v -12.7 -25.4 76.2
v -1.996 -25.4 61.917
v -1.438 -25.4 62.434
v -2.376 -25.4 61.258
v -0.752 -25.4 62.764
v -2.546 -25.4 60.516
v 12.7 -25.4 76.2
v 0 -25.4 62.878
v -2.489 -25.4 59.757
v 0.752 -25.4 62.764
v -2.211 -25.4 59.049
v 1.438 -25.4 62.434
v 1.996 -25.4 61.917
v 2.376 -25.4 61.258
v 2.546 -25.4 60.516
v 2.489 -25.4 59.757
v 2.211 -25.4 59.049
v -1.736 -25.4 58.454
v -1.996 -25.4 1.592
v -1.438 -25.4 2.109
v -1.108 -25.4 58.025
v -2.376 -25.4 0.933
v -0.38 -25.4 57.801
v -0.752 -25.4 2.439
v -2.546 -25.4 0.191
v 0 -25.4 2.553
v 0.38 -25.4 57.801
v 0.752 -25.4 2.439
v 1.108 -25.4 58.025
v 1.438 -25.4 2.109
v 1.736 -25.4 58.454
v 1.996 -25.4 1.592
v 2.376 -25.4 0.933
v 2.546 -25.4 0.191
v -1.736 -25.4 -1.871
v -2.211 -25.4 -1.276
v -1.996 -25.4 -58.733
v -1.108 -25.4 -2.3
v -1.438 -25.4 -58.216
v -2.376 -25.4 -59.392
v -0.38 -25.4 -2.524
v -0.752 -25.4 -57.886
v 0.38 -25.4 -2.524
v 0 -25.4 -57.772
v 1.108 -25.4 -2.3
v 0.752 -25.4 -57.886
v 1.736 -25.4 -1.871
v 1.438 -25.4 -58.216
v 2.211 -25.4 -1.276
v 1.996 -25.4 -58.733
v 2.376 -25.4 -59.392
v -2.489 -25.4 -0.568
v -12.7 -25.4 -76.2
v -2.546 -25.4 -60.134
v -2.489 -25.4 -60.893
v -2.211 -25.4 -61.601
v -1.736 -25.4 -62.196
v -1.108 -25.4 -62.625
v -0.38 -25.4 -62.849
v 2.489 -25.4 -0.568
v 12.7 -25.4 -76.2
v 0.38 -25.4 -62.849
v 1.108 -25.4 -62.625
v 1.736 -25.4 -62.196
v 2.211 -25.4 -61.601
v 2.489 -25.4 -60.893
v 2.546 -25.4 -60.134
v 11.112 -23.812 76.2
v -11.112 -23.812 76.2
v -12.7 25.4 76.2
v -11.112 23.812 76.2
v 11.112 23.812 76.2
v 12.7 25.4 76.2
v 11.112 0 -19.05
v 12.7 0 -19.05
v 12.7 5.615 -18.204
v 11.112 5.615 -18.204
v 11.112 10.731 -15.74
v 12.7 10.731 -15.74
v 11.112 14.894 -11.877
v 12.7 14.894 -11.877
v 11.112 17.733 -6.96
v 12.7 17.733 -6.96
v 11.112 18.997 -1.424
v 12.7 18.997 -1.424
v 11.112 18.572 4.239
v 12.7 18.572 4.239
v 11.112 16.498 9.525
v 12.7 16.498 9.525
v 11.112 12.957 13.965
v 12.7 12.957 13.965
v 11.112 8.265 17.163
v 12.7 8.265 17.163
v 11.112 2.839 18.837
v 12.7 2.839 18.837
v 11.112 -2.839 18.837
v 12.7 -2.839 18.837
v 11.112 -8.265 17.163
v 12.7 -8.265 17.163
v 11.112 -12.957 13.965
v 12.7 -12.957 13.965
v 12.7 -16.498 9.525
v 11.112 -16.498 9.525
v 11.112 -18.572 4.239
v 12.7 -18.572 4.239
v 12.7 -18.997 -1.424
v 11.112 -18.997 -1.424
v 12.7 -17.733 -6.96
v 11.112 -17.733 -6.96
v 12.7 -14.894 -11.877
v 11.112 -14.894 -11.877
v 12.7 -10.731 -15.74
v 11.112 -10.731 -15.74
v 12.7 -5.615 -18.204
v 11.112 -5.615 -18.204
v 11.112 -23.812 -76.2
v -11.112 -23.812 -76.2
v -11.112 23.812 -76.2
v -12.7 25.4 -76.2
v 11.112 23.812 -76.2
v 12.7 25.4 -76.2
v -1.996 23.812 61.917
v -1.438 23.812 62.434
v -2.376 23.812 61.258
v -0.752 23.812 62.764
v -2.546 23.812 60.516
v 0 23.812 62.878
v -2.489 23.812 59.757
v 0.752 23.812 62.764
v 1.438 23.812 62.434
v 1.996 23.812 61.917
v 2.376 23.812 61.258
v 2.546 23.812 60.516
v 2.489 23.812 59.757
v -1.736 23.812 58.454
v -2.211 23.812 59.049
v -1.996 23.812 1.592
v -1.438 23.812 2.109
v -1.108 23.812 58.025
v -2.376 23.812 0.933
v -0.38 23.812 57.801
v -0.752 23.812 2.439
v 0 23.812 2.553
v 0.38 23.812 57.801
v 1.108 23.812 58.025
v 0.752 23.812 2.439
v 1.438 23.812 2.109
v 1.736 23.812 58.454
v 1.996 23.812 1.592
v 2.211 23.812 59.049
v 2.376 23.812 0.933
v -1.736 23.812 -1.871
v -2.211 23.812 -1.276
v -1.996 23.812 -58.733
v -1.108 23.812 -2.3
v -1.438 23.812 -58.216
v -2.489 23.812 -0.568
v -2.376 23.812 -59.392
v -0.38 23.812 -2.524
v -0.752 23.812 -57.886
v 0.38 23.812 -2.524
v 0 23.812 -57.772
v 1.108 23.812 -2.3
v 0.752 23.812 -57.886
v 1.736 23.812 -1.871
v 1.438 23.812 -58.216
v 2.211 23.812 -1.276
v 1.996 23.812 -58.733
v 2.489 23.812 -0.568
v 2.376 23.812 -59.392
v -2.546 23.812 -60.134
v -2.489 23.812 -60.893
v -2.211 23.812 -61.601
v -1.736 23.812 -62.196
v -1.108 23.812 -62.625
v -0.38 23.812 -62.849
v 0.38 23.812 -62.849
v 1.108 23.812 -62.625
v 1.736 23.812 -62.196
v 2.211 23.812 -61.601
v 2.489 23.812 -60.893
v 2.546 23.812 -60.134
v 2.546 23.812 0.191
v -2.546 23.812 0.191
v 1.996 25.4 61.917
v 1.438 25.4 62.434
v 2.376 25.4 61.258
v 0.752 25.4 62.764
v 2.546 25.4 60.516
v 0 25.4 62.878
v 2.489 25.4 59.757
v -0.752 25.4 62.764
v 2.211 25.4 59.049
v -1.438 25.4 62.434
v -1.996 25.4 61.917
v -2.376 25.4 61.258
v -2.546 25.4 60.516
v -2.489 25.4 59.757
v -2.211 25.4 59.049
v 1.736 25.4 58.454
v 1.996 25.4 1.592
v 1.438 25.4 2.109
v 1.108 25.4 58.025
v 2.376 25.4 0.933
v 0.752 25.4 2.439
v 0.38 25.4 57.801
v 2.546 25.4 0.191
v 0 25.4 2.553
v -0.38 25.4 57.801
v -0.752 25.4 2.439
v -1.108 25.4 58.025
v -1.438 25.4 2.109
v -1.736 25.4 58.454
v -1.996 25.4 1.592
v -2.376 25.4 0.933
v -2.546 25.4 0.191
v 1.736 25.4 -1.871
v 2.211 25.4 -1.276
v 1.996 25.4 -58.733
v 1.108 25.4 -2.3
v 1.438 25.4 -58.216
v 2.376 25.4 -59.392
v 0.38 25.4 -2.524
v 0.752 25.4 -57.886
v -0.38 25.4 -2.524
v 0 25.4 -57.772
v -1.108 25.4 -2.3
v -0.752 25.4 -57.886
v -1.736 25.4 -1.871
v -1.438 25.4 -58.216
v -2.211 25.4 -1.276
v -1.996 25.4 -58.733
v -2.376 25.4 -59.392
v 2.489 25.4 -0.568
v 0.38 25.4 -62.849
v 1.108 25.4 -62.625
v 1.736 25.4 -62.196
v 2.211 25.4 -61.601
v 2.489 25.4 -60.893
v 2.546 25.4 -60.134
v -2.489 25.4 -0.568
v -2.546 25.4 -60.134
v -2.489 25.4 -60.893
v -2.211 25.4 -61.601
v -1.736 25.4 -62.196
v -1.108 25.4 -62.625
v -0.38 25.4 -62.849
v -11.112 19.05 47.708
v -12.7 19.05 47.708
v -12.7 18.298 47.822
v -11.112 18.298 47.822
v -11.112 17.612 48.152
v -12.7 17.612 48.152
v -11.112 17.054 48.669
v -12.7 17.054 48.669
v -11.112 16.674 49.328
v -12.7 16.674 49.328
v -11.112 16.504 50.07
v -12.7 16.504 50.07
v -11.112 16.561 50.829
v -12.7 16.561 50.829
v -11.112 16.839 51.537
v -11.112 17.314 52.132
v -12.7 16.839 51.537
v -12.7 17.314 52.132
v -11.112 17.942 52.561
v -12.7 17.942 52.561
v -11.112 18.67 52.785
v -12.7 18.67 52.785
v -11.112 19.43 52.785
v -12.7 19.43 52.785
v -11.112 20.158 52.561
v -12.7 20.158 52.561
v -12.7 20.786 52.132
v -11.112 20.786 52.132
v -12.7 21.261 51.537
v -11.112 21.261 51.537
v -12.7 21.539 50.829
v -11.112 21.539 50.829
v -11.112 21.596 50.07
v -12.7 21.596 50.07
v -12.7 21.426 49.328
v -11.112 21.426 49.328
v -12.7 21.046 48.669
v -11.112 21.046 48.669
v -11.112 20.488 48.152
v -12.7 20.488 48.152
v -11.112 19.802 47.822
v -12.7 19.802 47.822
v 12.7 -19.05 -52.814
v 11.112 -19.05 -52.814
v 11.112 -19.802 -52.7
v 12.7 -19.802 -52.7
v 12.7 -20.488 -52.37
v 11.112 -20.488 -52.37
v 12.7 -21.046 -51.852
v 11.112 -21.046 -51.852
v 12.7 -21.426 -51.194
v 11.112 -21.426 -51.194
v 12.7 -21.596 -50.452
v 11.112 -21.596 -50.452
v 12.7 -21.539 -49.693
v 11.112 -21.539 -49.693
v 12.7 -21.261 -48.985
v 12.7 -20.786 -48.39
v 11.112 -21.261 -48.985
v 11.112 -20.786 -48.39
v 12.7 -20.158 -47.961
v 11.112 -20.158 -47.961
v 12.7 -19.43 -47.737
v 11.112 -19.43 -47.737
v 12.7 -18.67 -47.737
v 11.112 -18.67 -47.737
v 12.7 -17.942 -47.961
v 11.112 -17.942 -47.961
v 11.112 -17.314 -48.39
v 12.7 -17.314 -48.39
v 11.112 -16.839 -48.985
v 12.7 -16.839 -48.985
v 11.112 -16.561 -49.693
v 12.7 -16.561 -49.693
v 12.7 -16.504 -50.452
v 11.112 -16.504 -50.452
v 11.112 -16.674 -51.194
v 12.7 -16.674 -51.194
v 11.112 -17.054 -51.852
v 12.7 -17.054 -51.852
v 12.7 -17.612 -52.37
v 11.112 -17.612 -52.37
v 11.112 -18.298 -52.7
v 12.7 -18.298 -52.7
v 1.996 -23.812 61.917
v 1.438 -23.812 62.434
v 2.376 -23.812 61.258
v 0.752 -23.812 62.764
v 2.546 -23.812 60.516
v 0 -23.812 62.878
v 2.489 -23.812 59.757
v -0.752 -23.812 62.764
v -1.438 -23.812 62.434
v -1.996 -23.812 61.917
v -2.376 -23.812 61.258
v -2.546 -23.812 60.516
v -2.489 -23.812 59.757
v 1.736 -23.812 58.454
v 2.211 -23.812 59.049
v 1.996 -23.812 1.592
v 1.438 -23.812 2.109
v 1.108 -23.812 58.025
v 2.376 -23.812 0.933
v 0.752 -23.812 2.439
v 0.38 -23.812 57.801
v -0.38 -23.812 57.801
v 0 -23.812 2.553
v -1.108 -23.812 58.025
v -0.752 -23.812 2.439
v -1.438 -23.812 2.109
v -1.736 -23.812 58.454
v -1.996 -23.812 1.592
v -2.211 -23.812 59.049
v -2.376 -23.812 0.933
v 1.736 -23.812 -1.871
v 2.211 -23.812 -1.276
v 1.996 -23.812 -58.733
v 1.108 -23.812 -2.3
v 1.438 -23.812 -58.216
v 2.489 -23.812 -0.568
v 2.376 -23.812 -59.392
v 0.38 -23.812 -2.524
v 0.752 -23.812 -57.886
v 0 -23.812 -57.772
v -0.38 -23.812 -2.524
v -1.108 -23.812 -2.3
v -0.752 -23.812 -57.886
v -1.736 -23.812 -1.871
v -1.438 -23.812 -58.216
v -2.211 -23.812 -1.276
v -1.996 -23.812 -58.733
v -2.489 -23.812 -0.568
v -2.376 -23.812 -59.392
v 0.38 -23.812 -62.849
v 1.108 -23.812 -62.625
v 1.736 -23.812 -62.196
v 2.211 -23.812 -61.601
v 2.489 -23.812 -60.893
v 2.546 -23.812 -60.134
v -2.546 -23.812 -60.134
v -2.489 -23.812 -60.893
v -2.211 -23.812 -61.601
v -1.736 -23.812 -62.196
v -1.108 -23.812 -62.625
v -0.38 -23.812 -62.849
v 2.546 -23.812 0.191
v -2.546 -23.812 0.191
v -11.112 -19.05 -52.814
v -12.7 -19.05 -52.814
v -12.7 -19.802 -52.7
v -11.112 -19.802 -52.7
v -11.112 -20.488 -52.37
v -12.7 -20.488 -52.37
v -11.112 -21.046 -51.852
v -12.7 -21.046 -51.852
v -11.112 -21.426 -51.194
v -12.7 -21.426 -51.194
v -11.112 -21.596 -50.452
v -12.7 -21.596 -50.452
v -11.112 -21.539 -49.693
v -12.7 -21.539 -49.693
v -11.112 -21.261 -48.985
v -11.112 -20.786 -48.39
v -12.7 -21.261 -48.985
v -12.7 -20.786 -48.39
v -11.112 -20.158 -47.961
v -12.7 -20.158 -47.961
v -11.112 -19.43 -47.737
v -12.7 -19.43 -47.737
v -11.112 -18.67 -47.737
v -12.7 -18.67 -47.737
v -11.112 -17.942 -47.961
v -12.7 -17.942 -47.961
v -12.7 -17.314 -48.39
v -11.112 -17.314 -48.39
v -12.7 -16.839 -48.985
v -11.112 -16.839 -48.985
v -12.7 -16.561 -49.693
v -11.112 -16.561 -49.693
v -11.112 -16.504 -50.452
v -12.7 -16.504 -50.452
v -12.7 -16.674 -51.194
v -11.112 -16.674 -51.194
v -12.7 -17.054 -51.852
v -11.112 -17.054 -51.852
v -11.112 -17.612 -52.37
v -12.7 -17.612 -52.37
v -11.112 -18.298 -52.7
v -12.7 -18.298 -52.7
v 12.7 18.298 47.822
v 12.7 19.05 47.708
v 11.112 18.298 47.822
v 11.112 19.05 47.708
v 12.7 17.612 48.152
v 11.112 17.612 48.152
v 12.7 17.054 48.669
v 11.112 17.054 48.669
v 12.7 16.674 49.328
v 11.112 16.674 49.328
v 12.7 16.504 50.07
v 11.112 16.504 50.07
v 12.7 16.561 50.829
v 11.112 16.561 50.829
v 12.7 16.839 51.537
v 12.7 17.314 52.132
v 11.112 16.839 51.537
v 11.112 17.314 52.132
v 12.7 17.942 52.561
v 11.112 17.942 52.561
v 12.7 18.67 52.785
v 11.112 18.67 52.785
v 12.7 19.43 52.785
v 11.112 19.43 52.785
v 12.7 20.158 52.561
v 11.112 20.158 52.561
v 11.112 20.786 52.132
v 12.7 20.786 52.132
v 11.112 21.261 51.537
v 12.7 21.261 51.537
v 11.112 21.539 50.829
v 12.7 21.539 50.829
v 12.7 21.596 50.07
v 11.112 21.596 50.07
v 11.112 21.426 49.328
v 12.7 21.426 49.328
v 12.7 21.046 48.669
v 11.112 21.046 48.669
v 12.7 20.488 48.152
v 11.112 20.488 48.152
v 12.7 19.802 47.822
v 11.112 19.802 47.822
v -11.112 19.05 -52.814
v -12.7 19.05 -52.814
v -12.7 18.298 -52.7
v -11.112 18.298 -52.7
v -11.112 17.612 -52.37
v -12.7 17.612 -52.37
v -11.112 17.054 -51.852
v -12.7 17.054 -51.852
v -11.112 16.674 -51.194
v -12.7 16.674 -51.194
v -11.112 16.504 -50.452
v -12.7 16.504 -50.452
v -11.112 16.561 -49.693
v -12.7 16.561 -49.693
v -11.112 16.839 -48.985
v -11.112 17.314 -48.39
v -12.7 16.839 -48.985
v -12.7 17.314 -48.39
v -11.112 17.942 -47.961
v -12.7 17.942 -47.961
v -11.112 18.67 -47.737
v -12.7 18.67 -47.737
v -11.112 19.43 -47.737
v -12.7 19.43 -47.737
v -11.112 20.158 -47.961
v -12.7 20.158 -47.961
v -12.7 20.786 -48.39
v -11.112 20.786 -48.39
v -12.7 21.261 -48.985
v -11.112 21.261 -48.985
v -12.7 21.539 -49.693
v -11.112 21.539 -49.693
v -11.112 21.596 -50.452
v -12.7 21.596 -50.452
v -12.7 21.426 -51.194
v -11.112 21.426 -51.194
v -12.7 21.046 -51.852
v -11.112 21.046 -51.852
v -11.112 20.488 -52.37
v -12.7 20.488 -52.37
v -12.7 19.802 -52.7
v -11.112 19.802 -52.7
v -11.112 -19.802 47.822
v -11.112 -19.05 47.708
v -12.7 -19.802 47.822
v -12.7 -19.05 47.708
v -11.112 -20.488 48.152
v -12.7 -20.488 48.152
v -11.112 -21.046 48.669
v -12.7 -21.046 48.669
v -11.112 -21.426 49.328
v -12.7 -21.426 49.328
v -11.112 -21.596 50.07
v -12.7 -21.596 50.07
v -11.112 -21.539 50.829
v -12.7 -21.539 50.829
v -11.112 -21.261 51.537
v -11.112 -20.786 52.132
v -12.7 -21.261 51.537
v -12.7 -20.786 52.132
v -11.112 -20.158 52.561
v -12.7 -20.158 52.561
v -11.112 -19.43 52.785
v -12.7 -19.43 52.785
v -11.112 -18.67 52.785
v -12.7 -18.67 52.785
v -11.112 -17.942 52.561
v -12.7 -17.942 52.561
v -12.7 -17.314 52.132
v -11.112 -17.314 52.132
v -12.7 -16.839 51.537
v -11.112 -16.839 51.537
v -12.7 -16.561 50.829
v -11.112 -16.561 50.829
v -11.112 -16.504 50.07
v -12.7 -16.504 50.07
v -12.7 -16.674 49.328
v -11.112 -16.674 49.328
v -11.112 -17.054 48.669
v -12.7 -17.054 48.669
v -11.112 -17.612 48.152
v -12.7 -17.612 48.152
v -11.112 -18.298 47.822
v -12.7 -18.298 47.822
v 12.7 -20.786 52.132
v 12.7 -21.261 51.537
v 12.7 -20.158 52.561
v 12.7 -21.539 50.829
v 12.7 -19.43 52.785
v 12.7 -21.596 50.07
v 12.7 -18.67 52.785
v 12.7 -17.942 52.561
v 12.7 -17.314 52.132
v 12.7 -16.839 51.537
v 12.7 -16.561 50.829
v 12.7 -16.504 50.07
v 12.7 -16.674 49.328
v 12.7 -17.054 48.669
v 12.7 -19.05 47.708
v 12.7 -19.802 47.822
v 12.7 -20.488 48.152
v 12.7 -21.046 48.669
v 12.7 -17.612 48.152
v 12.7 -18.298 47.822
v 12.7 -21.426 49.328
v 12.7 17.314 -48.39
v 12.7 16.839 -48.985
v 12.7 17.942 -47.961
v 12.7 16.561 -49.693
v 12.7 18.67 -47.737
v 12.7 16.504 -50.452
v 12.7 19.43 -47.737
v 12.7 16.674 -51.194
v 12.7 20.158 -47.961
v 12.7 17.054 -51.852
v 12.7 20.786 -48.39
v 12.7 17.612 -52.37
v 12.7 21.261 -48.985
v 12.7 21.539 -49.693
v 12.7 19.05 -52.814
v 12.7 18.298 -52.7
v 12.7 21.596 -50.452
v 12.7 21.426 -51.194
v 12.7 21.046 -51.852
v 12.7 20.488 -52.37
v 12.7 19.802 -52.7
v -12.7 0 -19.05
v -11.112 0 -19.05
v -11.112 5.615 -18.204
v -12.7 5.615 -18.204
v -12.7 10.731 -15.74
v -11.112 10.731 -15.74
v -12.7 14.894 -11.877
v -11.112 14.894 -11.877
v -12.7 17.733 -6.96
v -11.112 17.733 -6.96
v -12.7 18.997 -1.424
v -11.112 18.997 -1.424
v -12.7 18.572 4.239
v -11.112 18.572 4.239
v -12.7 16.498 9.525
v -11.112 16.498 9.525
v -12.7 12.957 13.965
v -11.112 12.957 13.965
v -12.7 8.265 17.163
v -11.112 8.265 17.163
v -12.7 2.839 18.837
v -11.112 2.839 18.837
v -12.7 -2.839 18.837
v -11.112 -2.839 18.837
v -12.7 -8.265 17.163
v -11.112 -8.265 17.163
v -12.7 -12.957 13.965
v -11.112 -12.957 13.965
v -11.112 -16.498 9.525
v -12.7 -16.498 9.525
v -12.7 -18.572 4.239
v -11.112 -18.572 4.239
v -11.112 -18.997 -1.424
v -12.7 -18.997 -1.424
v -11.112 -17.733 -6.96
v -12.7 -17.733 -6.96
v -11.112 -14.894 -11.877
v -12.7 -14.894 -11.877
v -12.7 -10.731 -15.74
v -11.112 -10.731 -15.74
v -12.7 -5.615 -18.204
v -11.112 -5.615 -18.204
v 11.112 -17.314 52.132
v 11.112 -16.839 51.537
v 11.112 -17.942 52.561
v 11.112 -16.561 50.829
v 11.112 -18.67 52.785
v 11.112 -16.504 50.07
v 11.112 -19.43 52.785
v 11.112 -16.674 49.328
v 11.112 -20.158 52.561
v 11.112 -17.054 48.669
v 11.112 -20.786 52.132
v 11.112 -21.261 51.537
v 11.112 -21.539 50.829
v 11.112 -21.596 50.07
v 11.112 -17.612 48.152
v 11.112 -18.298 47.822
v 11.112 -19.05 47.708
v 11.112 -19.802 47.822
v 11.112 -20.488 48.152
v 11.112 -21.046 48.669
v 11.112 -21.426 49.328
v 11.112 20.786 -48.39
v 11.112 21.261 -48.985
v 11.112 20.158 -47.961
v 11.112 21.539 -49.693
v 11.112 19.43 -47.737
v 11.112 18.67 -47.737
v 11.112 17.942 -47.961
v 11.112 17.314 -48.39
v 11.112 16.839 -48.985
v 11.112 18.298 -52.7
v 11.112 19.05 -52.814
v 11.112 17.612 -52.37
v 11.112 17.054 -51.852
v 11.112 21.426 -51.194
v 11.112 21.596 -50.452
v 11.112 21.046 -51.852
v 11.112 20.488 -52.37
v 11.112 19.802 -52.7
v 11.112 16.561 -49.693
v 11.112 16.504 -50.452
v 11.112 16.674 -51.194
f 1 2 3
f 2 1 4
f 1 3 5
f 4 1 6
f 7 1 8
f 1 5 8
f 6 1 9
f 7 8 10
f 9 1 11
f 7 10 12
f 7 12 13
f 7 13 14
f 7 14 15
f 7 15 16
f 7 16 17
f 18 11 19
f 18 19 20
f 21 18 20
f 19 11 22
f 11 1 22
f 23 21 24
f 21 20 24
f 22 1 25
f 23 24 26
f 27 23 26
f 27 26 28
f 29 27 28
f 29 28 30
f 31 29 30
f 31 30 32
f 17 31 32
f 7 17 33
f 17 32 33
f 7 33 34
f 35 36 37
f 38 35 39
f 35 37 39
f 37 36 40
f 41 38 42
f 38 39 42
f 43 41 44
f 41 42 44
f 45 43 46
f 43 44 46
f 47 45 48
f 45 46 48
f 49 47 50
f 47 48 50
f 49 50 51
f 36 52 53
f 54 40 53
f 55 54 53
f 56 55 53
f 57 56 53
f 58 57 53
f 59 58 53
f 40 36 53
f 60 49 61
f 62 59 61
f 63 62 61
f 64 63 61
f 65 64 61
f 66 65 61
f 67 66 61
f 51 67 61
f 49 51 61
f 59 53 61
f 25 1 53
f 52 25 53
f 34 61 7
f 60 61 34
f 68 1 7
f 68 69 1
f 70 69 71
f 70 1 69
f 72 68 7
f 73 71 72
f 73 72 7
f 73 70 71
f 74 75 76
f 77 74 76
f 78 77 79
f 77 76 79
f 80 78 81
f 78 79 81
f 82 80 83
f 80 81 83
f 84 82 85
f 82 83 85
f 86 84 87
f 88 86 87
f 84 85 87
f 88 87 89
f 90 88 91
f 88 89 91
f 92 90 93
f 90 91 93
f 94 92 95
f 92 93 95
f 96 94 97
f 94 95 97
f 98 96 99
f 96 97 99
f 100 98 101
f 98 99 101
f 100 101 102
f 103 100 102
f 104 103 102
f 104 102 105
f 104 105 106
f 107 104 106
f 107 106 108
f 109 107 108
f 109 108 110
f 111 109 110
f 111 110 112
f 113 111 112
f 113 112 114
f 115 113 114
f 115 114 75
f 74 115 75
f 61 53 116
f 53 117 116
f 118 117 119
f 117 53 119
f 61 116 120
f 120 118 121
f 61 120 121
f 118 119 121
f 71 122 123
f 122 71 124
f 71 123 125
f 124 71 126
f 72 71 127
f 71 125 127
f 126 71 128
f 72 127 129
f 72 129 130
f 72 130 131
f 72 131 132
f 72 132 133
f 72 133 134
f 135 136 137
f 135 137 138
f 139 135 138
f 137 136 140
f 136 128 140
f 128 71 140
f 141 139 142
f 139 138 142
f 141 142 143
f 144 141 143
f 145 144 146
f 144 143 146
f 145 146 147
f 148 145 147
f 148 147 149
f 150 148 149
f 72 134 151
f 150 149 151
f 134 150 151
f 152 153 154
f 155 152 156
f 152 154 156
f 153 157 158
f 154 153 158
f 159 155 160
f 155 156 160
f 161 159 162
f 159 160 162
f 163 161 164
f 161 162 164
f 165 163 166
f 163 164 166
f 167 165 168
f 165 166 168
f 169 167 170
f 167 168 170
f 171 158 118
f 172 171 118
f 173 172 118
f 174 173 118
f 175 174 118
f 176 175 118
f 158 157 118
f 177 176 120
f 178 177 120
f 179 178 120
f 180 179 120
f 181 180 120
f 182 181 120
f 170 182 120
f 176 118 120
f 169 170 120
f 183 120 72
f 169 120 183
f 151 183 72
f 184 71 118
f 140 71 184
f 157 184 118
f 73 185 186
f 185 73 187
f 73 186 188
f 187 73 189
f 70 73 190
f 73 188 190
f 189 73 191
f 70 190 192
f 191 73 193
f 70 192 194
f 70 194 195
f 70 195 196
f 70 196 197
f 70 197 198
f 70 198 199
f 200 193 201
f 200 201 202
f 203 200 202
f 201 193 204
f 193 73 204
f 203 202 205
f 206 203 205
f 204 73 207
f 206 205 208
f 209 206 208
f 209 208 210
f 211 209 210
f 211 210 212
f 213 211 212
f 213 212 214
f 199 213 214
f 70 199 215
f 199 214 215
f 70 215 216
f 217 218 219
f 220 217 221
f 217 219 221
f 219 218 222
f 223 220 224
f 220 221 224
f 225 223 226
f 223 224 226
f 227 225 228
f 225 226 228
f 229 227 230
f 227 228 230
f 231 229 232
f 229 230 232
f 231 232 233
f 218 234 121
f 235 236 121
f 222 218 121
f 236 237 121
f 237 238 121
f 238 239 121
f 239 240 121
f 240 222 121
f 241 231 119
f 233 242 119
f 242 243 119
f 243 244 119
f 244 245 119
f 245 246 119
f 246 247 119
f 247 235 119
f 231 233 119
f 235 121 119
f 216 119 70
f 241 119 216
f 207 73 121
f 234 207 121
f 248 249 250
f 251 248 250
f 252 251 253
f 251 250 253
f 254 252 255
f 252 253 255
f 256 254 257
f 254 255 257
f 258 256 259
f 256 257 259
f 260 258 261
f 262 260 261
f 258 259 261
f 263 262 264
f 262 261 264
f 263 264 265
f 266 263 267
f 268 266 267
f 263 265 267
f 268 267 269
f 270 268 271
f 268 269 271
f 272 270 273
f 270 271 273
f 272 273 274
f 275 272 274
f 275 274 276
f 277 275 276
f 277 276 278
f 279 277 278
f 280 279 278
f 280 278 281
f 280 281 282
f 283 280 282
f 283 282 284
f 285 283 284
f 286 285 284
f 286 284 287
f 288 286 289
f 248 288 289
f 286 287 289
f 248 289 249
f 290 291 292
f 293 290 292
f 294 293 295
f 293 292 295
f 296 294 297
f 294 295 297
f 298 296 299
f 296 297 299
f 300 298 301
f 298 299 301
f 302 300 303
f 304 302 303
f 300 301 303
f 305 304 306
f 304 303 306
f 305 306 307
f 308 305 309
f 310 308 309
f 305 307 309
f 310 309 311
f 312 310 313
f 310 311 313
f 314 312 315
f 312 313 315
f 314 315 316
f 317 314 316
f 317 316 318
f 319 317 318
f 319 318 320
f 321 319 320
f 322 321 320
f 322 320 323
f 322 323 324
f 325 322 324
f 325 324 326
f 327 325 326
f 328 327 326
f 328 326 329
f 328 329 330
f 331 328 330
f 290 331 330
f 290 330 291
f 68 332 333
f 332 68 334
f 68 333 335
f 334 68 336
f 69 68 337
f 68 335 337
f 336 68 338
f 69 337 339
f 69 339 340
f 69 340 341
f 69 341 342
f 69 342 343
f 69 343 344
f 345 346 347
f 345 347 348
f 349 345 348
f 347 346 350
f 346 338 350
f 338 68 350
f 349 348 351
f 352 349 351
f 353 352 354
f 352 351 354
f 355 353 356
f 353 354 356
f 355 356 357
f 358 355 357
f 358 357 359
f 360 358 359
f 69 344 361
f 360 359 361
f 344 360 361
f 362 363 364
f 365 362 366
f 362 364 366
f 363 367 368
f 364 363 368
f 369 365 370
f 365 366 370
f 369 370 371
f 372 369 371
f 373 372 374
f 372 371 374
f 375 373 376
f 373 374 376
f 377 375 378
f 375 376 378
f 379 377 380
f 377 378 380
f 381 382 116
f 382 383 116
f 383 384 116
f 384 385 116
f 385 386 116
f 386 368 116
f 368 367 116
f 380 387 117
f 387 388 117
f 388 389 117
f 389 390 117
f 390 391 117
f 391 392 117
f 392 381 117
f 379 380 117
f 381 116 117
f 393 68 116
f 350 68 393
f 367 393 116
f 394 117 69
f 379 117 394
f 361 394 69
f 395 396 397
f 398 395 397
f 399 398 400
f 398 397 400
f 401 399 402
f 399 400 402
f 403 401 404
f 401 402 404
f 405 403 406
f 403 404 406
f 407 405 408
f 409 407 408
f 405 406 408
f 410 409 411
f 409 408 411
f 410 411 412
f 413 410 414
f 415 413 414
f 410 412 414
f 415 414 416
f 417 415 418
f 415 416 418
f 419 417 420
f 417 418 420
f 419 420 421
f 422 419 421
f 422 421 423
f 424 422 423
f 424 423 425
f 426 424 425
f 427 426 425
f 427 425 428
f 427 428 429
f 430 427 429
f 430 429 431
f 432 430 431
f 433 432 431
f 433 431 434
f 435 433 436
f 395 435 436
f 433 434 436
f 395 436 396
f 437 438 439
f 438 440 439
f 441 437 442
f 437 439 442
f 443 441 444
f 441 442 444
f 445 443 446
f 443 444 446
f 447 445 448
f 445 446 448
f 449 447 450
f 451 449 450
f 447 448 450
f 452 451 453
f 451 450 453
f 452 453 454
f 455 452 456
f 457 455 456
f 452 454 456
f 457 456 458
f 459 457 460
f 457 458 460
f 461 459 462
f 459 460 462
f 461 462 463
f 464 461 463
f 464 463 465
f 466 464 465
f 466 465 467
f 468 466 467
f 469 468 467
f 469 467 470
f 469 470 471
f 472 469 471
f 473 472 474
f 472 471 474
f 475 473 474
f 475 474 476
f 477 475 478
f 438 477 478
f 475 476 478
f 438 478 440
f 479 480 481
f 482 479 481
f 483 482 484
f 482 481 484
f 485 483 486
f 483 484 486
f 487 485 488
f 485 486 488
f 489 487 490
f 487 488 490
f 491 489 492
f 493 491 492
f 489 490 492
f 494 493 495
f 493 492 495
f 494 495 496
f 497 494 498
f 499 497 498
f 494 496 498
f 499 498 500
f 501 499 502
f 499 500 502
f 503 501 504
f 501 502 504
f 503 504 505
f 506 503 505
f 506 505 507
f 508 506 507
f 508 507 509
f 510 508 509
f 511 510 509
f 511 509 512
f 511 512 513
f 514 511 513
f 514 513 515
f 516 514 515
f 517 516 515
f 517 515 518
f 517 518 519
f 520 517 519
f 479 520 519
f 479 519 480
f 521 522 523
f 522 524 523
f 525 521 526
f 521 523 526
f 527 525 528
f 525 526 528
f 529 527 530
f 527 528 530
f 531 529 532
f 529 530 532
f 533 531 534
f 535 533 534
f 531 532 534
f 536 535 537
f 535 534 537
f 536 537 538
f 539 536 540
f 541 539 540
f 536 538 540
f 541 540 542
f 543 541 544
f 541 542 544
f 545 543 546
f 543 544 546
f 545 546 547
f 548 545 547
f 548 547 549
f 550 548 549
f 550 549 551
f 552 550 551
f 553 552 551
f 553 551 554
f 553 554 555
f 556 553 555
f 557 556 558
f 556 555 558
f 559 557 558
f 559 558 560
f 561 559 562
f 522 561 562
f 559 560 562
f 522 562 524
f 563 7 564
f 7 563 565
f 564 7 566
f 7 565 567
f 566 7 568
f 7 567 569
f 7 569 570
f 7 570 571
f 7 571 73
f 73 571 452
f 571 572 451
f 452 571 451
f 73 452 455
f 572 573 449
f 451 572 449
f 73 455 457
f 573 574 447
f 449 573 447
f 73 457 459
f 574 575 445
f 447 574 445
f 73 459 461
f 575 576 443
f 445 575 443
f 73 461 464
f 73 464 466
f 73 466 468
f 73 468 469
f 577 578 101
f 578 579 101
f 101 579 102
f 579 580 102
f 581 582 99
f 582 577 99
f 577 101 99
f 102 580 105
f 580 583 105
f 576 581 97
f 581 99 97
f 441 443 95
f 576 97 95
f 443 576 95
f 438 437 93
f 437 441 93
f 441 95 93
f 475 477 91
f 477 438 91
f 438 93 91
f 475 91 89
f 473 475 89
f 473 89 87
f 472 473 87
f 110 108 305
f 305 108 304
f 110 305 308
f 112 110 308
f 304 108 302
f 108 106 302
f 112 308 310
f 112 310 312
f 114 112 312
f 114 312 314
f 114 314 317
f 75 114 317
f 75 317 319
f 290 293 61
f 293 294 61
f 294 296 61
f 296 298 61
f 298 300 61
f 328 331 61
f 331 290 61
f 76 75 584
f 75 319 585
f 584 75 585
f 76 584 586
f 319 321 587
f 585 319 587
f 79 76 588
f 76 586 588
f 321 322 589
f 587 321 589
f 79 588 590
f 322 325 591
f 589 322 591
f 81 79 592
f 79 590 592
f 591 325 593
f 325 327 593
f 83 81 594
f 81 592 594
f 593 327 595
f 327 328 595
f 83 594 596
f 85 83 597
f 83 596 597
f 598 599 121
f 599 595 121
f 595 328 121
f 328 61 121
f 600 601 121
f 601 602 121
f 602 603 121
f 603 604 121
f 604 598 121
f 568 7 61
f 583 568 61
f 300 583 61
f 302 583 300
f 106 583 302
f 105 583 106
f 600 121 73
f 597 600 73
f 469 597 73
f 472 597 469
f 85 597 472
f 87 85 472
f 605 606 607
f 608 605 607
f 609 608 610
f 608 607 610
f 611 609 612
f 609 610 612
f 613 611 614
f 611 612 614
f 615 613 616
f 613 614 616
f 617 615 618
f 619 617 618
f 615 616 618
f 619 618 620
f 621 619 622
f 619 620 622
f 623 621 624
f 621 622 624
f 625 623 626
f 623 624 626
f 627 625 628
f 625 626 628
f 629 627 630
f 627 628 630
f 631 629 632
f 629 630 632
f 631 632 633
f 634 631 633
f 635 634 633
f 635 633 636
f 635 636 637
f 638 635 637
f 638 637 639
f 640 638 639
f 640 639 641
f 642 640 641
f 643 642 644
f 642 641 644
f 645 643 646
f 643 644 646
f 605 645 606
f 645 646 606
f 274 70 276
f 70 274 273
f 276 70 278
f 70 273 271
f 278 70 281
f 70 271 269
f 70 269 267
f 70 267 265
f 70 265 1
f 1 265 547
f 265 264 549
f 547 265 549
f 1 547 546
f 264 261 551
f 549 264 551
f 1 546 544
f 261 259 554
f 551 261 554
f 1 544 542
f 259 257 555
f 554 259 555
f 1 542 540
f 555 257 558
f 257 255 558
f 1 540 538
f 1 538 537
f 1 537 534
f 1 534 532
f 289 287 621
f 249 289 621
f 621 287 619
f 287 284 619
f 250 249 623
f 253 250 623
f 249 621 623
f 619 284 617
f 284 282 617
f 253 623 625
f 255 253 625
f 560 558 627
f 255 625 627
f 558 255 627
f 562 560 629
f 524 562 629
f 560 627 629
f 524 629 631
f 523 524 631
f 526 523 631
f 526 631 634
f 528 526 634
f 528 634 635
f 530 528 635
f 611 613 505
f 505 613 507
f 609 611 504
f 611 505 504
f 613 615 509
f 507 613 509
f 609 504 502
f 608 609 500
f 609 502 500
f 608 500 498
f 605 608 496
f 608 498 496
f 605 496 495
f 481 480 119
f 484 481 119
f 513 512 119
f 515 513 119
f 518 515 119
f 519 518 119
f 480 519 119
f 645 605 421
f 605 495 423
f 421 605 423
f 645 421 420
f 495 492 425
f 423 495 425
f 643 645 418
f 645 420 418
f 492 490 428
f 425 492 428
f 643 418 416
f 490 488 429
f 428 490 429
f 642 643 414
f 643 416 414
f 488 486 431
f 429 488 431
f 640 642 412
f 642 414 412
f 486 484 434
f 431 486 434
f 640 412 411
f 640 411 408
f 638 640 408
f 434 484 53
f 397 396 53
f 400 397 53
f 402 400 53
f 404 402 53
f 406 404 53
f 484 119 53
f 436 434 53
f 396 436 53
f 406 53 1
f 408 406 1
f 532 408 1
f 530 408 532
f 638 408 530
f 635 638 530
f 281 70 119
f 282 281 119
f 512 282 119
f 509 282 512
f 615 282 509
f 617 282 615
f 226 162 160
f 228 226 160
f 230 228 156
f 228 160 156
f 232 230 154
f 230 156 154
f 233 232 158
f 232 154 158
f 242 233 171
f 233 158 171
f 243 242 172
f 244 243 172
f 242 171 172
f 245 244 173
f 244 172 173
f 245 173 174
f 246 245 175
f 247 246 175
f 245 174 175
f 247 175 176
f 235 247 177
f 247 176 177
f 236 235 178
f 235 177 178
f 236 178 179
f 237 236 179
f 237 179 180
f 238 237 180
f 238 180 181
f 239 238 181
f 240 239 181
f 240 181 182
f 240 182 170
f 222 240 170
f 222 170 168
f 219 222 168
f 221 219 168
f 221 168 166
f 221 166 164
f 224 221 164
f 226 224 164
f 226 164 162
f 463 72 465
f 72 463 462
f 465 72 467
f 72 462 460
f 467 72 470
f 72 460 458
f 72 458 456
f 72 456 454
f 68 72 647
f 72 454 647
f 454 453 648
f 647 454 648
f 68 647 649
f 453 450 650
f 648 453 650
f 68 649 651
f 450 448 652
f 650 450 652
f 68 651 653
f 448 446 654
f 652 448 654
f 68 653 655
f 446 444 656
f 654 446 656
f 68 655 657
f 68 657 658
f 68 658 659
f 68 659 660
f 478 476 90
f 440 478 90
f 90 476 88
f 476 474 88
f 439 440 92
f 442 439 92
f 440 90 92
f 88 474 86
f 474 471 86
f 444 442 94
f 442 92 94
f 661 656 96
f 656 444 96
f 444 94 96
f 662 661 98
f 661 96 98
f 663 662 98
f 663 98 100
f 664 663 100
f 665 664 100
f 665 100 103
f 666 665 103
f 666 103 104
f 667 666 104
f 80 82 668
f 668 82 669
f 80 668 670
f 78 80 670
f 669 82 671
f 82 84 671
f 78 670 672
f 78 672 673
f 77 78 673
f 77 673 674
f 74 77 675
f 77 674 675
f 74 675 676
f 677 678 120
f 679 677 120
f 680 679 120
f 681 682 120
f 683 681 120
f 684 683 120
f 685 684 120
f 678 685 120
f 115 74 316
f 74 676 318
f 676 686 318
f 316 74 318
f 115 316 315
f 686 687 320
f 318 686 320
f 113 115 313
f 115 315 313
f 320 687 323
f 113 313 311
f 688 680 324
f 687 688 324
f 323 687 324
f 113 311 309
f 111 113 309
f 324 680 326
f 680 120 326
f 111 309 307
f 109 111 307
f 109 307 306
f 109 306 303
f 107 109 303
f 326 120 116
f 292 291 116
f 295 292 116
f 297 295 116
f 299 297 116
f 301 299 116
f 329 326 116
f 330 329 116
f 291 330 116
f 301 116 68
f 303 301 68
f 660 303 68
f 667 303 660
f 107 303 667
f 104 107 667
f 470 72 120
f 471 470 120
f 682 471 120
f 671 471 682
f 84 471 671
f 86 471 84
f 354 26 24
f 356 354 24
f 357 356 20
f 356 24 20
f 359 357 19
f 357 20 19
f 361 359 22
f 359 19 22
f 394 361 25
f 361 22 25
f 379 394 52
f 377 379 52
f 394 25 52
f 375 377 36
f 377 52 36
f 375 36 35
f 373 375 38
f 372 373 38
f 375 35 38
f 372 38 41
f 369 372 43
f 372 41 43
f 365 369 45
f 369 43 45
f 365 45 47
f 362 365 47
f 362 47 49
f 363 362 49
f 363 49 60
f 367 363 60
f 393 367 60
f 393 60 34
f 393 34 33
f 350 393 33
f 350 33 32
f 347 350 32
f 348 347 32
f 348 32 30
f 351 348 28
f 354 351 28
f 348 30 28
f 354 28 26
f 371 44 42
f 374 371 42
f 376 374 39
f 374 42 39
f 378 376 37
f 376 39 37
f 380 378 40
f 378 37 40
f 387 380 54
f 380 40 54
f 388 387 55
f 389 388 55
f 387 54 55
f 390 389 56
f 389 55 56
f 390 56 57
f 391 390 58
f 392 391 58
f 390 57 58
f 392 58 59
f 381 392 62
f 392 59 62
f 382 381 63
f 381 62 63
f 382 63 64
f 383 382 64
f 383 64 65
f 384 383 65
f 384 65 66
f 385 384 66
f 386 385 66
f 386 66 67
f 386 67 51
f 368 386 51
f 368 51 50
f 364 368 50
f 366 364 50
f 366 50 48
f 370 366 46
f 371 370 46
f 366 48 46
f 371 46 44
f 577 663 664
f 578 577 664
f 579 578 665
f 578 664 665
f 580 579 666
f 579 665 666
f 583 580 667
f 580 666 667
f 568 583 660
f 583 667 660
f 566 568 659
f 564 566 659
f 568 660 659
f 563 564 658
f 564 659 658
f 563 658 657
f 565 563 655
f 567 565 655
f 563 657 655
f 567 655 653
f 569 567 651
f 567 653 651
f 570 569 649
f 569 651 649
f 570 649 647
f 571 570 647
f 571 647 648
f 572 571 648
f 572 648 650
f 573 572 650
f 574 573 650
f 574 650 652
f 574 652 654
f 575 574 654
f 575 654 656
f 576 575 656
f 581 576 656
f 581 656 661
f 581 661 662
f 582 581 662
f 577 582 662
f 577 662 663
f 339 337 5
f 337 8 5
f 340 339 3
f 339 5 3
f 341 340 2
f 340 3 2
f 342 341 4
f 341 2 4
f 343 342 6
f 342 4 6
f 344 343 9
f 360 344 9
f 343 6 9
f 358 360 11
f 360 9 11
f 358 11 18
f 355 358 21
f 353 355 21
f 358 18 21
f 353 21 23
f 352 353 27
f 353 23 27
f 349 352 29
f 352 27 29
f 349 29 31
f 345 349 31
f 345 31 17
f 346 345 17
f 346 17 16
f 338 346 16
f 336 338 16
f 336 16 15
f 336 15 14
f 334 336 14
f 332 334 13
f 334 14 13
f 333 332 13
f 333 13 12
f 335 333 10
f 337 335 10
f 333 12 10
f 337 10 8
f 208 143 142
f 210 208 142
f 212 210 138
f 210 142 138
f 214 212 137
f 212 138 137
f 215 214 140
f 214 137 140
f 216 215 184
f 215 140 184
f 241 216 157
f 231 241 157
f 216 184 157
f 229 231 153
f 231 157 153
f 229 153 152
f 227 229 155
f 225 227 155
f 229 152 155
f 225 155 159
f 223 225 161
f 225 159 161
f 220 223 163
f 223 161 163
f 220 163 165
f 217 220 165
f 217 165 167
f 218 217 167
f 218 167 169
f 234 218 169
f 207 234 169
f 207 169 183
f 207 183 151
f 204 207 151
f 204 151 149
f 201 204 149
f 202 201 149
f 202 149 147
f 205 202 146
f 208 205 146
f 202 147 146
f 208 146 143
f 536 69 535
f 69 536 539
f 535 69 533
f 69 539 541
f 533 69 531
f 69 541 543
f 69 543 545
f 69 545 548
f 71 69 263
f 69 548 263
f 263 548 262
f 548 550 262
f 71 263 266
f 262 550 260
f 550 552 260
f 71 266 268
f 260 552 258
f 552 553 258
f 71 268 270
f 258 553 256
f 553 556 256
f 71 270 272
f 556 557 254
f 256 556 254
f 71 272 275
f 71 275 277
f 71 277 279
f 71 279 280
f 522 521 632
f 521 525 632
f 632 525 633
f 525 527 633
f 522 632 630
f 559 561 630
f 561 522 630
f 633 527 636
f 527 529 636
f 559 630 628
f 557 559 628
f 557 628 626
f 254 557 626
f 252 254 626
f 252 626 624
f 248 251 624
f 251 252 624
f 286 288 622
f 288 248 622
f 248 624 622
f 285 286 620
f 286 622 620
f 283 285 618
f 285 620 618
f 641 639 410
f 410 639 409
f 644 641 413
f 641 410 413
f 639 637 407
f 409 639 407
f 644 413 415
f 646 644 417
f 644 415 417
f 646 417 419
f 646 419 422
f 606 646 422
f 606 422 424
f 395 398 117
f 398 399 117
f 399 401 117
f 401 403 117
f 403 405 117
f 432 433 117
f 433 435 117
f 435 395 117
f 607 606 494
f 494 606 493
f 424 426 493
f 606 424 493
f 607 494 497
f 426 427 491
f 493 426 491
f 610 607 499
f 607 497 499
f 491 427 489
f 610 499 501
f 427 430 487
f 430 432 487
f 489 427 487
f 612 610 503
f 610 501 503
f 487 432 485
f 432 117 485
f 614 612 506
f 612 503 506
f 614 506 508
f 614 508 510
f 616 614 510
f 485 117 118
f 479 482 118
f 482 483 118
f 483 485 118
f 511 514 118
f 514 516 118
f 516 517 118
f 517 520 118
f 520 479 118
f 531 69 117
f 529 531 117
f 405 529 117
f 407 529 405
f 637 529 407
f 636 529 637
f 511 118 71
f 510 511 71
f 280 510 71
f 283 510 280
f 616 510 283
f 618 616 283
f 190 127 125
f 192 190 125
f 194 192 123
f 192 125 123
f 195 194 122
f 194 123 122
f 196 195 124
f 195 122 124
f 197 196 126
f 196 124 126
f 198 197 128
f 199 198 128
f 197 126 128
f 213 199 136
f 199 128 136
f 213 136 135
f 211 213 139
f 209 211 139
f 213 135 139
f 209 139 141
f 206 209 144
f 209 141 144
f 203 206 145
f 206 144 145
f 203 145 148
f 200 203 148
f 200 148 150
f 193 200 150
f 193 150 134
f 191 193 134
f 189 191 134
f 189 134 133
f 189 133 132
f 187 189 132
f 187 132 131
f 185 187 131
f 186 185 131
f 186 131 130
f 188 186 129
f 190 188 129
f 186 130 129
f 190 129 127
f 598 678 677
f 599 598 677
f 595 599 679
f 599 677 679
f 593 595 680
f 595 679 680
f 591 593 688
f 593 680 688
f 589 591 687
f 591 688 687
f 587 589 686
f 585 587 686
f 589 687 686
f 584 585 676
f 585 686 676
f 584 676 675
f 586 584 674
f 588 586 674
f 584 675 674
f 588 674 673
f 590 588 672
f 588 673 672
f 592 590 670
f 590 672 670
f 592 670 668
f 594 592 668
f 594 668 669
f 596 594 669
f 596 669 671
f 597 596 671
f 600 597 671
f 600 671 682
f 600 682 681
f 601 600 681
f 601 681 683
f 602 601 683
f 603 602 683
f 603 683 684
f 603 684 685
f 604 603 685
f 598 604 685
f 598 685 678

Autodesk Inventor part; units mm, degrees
ref_plane "YZ Plane" through (0, 0, 0) normal (1, 0, 0) x (0, 1, 0)
ref_plane "XZ Plane" through (0, 0, 0) normal (0, 1, 0) x (-1, 0, 0)
ref_plane "XY Plane" through (0, 0, 0) normal (0, 0, 1) x (1, 0, 0)
sketch "Sketch1" plane through (0, 0, 0) normal (0, 0, 1) x (1, 0, 0)
  line L0 (-12.7, -25.4) -> (12.7, -25.4)
  line L1 (12.7, -25.4) -> (12.7, 25.4)
  line L2 (12.7, 25.4) -> (-12.7, 25.4)
  line L3 (-12.7, 25.4) -> (-12.7, -25.4)
  line L4 (-12.7, -25.4) -> (12.7, 25.4) construction
  line L5 (12.7, -25.4) -> (-12.7, 25.4) construction
  line L6 (-11.1125, 23.8125) -> (11.1125, 23.8125)
  line L7 (11.1125, 23.8125) -> (11.1125, -23.8125)
  line L8 (11.1125, -23.8125) -> (-11.1125, -23.8125)
  line L9 (-11.1125, -23.8125) -> (-11.1125, 23.8125)
  point P0 (0, 0)
  dimension "width" = 25.4
  dimension "height" = 50.8
  dimension "thickness" = 1.5875
extrude "Extrusion1" add sketch "Sketch1" along normal mid plane 152.4
sketch "Sketch2" plane through (-12.7, 25.4, 76.2) normal (0, 1, 0) x (1, 0, 0)
  line L0 (0, 152.4) -> (0, 0) construction
  line L1 (25.4, 0) -> (0, 0) construction
  line L2 (25.4, 152.4) -> (25.4, 0) construction
  line L3 (0, 152.4) -> (25.4, 152.4) construction
  line L4 (12.7, 136.525) -> (12.7, 15.875) construction
  point P0 (12.7, 76.2)
  point P1 (12.7, 76.2)
  point P2 (12.7, 76.2)
  dimension "d5" = 120.65
hole "Hole1" at (0, 25.4, -60.325) at (0, 25.4, 60.325) at (0, 25.4, 0) direction (0, -1, 0) diameter 5.1054 end through all clearance for "Flat Head Machine Screw (82)" size "#10" standard "Ansi Unified Screw Threads"
sketch "Sketch4" plane through (12.7, -25.4, 76.2) normal (1, 0, 0) x (0, 0, -1)
  circle A0 centre (76.2, 25.4) radius 53.75 construction
  line L0 (25.9391, 6.35) -> (126.4609, 6.35) construction
  line L1 (126.4609, 6.35) -> (126.4609, 44.45) construction
  line L2 (126.4609, 44.45) -> (25.9391, 44.45) construction
  line L3 (25.9391, 44.45) -> (25.9391, 6.35) construction
  line L4 (25.9391, 6.35) -> (126.4609, 44.45) construction
  line L5 (126.4609, 6.35) -> (25.9391, 44.45) construction
  line L6 (0, 0) -> (0, 50.8) construction
  dimension "d25" = 107.5
  dimension "d28" = 38.1
hole "Hole3" at (12.7, 19.05, 50.2609) at (12.7, 19.05, -50.2609) at (12.7, -19.05, -50.2609) at (12.7, -19.05, 50.2609) direction (-1, 0, 0) diameter 5.1054 end through all clearance for "Flat Head Machine Screw (82)" size "#10" standard "Ansi Unified Screw Threads"
sketch "Sketch5" plane through (12.7, -25.4, 76.2) normal (1, 0, 0) x (0, 0, -1)
  circle A0 centre (76.2, 25.4) radius 19.05
  dimension "d36" = 38.1
extrude "Extrusion2" cut sketch "Sketch5" against normal blind 25.4
sketch "Sketch3" plane through (12.7, -25.4, 76.2) normal (1, 0, 0) x (0, 0, -1)
  line L0 (25.9391, 44.45) -> (126.4609, 44.45) construction
  line L1 (126.4609, 44.45) -> (126.4609, 6.35) construction
  line L2 (126.4609, 6.35) -> (25.9391, 6.35) construction
  line L3 (25.9391, 6.35) -> (25.9391, 44.45) construction
  line L4 (25.9391, 44.45) -> (126.4609, 6.35) construction
  line L5 (126.4609, 44.45) -> (25.9391, 6.35) construction
  circle A0 centre (76.2, 25.4) radius 60 construction
  circle A1 centre (76.2, 25.4) radius 47.5 construction
  circle A2 centre (76.2, 25.4) radius 53.75 construction
  dimension "d16" = 107.5
  dimension "d14" = 120
  dimension "d15" = 95
  dimension "d17" = 38.1
properties part number "GP7-004" material "Aluminum 6061"
